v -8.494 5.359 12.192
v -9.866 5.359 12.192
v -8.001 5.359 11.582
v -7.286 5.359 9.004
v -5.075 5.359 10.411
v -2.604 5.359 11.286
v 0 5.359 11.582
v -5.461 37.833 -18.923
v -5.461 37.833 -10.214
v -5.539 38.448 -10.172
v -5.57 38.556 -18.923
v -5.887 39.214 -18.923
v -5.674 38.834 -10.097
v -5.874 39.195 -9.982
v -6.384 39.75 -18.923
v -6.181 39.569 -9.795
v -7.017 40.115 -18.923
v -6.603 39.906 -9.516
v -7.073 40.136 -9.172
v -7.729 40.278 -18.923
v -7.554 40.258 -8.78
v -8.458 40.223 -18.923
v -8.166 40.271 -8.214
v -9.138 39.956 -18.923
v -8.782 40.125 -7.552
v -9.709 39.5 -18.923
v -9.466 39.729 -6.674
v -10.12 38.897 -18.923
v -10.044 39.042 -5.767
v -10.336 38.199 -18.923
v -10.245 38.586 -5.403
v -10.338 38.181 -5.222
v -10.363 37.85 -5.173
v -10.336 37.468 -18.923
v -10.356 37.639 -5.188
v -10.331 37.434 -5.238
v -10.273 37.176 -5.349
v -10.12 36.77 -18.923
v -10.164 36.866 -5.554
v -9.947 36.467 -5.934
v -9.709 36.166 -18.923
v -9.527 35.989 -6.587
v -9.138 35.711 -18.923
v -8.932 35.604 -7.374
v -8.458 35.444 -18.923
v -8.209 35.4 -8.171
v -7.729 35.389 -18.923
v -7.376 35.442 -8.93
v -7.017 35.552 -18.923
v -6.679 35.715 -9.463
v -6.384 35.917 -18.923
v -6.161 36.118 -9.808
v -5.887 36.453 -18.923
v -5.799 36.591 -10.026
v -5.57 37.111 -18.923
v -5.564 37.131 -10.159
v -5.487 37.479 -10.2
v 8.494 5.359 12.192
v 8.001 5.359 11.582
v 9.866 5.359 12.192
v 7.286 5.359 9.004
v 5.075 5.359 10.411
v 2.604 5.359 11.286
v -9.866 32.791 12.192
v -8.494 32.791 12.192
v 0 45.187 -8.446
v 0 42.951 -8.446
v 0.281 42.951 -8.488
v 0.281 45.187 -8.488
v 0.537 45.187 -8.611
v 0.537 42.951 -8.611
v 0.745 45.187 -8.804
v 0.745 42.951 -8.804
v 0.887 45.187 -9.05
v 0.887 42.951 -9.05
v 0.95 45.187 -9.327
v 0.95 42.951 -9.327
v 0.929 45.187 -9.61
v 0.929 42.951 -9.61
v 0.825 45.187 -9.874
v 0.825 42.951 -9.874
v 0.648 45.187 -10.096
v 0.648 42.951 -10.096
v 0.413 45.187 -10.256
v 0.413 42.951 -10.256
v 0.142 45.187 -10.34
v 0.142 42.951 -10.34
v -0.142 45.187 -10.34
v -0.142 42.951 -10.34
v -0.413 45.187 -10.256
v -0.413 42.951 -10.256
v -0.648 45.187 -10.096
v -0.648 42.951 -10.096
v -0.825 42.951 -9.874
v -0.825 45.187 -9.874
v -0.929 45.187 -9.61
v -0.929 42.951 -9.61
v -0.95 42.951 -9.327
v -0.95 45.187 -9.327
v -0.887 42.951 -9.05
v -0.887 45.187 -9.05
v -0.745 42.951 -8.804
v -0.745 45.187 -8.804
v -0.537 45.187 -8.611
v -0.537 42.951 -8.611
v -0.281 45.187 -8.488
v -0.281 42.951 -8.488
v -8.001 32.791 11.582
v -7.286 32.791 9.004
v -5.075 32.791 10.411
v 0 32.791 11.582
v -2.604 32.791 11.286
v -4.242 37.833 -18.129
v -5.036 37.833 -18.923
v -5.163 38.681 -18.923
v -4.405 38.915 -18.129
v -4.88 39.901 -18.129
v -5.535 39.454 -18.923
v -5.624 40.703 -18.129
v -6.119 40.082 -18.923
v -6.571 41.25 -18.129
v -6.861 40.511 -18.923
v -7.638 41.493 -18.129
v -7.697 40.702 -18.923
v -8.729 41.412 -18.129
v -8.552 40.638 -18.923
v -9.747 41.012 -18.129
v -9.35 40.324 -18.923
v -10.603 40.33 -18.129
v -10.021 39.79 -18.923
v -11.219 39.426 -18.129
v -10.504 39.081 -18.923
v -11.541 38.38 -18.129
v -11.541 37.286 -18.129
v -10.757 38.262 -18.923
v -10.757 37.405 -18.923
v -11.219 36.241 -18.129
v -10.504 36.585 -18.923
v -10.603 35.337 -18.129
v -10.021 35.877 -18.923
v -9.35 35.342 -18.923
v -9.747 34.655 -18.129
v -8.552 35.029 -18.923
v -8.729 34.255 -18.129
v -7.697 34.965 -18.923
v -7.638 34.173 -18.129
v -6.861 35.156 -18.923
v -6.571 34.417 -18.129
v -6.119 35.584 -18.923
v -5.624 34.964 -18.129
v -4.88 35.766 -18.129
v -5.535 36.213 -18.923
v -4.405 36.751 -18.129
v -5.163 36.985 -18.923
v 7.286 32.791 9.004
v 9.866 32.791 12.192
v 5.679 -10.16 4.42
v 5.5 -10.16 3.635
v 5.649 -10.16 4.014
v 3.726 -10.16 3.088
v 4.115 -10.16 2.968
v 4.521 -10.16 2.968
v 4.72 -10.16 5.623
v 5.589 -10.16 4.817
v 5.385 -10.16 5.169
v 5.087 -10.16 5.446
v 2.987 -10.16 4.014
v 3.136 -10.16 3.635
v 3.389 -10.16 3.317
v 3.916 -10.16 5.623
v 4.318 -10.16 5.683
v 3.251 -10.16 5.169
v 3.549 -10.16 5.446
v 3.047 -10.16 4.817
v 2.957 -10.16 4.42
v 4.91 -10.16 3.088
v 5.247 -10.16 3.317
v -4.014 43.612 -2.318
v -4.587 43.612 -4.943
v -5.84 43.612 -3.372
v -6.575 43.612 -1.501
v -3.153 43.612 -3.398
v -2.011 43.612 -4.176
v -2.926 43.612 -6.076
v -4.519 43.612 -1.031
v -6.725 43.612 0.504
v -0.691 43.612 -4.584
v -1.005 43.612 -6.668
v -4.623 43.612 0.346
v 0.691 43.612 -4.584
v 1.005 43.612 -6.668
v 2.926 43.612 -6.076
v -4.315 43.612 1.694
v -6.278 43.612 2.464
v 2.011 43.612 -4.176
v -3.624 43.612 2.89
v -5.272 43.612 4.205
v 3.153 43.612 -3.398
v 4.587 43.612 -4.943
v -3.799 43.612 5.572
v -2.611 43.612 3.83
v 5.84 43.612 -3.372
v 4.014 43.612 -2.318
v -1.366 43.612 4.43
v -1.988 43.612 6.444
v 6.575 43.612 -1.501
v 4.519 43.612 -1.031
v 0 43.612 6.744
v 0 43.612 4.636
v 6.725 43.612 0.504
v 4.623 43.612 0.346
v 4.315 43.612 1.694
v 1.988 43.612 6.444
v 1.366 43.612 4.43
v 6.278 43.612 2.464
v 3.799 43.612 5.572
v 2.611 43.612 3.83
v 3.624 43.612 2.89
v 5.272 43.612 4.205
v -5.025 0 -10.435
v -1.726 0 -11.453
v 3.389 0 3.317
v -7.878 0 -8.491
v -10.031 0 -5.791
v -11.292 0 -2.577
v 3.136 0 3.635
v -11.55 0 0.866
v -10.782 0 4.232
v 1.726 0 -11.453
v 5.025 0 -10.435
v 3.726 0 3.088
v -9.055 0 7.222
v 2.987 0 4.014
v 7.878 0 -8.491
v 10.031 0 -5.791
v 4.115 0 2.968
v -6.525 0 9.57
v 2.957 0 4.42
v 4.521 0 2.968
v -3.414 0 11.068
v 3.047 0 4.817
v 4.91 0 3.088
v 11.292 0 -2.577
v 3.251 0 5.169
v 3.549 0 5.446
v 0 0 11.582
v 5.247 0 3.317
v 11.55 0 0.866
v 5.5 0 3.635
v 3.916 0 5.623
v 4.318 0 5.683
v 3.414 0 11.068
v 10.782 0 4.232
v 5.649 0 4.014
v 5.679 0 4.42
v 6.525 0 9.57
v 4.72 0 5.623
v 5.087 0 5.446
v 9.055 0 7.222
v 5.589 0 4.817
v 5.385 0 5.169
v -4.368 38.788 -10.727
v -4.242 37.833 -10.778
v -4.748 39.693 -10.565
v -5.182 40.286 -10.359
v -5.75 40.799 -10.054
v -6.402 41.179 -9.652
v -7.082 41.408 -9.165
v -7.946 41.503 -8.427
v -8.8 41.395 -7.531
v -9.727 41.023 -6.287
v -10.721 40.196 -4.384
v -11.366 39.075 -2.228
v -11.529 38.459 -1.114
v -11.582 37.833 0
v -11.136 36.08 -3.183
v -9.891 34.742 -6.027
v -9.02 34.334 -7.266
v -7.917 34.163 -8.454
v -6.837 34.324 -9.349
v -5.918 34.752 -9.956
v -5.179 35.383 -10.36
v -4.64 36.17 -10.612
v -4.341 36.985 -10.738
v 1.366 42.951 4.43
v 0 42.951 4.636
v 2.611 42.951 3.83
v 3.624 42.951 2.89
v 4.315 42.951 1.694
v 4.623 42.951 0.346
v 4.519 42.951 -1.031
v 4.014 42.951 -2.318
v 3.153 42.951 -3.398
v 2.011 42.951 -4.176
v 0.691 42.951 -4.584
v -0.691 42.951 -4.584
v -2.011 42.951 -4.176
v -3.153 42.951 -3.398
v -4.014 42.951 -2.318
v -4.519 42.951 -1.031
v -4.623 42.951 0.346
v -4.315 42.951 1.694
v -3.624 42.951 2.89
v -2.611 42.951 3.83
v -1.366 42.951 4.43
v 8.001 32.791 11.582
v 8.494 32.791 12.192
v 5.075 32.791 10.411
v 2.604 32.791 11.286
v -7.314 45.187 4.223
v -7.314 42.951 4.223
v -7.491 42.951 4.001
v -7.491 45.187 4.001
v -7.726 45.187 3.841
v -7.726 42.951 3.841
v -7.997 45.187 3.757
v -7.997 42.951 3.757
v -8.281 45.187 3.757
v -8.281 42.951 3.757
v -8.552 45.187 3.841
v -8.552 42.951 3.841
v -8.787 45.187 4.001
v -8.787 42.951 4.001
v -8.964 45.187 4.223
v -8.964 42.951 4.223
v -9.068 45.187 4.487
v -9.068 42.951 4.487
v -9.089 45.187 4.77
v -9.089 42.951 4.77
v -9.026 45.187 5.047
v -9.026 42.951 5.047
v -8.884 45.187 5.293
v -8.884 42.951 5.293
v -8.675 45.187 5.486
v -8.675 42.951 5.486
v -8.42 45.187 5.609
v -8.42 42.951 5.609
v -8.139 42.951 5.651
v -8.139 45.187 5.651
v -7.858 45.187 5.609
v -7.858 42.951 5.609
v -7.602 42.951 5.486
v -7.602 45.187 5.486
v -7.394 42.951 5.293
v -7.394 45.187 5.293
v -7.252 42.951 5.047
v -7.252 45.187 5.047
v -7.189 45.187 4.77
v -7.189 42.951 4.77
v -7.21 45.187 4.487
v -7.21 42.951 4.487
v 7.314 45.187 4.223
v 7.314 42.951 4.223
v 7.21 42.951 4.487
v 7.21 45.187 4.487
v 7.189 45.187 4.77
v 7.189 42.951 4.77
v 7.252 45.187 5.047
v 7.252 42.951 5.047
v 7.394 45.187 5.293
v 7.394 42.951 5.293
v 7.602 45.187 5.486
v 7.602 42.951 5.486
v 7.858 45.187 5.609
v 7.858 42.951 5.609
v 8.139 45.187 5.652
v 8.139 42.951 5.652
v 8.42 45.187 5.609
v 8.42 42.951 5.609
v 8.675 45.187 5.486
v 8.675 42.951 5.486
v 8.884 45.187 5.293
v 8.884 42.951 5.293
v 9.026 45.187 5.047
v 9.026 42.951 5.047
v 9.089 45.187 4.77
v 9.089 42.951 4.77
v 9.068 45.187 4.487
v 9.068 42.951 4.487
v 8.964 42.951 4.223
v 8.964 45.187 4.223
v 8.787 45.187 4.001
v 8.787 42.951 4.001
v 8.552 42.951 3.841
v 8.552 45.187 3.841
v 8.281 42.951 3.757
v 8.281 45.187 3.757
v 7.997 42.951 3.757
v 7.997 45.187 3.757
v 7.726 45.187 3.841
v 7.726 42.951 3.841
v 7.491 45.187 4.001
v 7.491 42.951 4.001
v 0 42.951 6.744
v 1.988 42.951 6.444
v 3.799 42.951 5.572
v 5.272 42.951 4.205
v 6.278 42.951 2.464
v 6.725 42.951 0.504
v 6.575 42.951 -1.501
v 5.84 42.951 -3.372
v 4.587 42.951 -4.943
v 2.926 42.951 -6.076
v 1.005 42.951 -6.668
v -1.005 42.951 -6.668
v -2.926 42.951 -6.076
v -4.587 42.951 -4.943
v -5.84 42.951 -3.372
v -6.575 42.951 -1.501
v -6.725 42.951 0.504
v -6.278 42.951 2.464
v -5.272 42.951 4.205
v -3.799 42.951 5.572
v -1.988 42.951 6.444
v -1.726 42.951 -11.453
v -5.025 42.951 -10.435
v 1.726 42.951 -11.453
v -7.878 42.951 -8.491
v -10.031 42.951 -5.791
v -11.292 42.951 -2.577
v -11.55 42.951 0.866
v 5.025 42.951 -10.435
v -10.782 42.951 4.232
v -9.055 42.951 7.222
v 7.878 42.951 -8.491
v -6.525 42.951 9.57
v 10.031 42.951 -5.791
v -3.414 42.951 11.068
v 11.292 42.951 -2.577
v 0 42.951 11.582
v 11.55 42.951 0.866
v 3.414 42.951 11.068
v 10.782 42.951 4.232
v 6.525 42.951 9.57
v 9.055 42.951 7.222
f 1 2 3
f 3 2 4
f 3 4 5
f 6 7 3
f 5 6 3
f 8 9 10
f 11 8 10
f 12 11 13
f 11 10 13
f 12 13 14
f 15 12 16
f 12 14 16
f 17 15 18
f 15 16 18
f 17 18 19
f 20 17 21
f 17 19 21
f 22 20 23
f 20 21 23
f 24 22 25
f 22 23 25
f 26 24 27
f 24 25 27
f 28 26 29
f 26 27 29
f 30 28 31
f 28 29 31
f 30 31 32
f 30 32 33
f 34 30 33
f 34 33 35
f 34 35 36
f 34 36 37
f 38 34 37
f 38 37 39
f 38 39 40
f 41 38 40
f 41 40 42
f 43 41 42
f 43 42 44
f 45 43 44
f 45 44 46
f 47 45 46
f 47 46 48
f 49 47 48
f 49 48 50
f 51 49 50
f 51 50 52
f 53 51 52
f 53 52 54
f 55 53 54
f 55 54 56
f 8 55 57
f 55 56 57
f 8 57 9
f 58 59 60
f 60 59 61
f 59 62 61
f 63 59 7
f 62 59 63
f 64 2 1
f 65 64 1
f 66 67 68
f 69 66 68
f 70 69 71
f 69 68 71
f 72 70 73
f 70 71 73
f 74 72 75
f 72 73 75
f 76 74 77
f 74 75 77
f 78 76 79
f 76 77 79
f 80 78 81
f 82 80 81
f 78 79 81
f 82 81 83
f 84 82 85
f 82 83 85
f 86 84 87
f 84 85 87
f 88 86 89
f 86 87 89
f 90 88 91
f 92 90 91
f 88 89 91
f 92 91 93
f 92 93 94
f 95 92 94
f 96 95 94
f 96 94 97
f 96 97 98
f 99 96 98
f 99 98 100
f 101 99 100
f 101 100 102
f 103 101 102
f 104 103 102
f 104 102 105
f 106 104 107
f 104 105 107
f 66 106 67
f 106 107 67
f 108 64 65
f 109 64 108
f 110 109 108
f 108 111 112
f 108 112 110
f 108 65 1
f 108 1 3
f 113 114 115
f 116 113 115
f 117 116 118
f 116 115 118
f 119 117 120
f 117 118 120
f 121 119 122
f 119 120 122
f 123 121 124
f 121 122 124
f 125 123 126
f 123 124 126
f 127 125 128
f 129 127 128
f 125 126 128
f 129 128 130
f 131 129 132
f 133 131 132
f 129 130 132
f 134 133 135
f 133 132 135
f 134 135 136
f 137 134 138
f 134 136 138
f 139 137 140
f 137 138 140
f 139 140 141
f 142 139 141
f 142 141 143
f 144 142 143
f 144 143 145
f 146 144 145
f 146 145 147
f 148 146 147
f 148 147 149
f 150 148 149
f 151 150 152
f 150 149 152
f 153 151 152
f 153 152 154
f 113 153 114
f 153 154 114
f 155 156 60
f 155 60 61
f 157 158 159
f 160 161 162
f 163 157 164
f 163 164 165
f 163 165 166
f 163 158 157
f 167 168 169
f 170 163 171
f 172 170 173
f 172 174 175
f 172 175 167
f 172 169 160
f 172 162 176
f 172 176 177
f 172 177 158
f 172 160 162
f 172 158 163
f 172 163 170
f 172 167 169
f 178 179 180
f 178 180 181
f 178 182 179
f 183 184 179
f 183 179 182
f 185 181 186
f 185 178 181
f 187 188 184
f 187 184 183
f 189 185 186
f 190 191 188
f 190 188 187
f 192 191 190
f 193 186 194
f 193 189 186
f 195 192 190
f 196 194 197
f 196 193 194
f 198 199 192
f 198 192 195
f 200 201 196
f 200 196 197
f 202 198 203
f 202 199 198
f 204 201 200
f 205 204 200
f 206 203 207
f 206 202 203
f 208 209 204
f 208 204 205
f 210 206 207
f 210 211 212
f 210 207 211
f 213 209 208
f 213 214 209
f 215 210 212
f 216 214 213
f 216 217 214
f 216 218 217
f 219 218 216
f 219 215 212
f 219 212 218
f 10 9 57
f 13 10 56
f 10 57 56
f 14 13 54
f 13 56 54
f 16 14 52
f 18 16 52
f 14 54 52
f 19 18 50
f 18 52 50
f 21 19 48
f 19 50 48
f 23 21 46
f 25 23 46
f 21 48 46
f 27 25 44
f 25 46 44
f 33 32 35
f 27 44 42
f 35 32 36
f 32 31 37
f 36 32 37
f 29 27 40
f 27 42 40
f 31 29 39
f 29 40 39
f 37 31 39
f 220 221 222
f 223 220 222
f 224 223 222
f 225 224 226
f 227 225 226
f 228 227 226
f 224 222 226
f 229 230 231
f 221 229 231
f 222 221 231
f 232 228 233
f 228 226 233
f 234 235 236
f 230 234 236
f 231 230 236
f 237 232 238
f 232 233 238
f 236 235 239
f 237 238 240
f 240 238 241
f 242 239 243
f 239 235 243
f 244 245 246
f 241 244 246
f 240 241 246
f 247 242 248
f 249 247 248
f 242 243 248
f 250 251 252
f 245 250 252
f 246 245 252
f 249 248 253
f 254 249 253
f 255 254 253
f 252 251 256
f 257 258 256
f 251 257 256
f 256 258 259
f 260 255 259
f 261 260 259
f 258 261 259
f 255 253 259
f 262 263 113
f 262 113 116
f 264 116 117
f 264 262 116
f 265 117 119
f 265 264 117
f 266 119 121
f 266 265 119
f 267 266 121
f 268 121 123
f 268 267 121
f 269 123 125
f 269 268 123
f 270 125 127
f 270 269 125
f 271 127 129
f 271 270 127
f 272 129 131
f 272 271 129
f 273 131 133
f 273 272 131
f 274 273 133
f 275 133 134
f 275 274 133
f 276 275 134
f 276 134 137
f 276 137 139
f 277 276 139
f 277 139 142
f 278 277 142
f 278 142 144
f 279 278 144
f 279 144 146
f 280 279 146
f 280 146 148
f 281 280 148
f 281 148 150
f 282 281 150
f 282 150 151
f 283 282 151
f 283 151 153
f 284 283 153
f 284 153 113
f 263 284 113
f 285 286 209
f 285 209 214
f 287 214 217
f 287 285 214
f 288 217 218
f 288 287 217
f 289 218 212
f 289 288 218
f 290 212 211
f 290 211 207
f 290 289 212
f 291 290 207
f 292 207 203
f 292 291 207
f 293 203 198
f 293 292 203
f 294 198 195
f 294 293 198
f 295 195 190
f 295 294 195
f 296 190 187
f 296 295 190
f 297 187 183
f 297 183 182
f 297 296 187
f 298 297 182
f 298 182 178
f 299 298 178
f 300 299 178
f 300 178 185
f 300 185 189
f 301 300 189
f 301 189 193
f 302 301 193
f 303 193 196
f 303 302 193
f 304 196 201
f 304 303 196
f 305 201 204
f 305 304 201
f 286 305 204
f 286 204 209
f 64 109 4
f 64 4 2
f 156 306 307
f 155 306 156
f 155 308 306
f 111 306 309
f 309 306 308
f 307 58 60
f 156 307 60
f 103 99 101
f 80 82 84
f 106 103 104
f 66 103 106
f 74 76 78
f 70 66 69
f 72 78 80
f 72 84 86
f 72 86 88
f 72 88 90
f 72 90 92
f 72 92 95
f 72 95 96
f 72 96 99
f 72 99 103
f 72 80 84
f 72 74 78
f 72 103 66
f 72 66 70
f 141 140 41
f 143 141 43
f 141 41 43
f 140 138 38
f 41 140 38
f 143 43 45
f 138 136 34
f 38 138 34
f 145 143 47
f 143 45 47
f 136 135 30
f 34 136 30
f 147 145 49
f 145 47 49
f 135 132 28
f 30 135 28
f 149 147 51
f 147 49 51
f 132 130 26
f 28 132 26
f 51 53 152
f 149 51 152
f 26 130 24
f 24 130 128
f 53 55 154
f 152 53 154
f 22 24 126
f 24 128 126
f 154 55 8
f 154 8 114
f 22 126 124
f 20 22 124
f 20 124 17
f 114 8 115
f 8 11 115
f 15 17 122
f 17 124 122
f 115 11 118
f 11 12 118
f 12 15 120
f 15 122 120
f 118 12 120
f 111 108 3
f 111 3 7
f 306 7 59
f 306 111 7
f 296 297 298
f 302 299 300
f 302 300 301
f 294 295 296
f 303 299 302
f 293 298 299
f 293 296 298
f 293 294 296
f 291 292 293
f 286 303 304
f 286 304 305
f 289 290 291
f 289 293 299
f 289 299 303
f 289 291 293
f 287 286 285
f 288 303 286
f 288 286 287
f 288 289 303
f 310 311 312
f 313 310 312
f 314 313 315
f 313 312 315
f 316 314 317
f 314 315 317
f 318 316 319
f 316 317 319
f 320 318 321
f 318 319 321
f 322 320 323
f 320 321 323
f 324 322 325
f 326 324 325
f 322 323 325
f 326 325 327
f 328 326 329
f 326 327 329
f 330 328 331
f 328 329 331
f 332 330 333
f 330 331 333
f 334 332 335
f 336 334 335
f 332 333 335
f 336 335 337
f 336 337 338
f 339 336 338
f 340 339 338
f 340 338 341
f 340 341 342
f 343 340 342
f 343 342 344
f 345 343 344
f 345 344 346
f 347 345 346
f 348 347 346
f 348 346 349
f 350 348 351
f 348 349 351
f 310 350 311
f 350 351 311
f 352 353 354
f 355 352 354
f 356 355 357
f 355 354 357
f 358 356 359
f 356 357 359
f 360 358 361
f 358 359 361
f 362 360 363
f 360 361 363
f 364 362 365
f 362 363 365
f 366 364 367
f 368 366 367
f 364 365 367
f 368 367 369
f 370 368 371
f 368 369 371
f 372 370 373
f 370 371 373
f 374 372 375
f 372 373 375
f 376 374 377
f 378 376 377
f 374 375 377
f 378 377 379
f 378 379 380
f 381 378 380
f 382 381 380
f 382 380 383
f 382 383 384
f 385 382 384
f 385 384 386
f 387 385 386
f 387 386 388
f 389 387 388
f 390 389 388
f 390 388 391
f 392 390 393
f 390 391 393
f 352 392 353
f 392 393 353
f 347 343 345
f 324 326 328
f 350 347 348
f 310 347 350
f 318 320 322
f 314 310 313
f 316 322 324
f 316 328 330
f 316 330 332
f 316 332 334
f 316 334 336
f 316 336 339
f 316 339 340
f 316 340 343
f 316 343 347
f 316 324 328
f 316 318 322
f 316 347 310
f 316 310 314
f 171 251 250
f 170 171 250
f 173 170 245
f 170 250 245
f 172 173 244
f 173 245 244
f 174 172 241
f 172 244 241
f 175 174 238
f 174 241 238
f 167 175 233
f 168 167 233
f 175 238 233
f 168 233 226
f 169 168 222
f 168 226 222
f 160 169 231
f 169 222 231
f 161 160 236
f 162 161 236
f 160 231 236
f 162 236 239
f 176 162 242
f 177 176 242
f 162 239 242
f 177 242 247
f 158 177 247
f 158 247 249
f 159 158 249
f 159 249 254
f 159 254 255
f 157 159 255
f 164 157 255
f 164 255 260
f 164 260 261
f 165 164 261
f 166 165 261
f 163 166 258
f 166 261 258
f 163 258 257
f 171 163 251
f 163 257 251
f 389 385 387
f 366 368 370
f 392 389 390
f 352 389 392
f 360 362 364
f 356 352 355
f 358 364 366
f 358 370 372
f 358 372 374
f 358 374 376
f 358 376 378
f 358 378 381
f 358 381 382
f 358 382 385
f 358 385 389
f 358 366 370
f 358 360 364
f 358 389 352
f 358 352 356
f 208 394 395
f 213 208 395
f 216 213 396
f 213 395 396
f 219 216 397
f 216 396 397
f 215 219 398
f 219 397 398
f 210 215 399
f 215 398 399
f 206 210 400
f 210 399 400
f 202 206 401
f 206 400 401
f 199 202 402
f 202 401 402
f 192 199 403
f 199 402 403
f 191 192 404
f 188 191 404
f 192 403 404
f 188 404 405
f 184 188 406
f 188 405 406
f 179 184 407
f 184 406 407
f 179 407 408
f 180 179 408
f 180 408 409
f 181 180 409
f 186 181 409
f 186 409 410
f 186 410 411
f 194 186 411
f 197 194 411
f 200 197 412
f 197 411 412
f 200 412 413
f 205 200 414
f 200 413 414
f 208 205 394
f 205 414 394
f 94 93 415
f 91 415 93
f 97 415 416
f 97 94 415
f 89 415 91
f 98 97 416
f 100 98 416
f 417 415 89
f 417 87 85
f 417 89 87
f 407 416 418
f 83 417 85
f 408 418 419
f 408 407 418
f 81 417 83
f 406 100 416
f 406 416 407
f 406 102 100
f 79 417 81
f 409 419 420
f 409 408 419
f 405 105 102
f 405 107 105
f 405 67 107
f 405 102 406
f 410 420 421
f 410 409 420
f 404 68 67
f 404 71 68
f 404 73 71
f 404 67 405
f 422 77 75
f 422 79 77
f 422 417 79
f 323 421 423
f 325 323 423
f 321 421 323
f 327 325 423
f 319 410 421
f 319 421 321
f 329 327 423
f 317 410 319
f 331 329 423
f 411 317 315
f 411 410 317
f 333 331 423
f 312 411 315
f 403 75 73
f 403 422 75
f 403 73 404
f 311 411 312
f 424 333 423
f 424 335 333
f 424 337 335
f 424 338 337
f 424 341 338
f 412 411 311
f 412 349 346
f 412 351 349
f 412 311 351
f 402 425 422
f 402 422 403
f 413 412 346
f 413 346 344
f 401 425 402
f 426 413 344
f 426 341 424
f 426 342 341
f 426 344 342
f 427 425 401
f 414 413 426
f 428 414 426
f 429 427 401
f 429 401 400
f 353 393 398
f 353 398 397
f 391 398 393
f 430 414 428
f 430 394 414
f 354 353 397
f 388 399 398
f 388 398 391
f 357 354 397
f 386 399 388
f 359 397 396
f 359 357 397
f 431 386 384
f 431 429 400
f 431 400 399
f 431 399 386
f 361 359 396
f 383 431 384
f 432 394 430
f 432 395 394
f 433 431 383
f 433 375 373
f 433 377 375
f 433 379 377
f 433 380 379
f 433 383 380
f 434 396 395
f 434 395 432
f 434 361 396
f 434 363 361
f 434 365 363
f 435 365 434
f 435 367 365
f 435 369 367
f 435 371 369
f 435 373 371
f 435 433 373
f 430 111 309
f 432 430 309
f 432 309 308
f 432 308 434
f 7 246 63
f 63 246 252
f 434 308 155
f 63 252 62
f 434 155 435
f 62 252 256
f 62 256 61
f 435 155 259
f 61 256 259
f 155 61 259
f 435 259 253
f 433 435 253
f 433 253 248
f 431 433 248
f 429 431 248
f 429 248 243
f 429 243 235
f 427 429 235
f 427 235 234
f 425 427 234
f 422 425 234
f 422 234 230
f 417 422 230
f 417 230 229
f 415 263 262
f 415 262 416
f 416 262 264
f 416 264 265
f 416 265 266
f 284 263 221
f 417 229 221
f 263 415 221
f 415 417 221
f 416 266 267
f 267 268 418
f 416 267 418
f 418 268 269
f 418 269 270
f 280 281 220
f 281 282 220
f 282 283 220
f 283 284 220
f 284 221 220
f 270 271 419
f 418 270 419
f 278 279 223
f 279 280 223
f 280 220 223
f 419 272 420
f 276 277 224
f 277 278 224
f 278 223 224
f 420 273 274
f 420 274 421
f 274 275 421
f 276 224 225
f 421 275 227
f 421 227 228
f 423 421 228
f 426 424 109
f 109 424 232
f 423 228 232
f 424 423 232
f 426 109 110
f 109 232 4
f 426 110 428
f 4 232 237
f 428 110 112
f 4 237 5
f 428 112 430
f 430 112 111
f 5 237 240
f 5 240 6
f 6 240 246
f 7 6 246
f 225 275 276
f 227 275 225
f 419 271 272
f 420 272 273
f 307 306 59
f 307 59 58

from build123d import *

# Parameters (mm, degrees)
SKETCH1_R           = 11.5824
BOSS_EXTRUDE1_DEPTH = 42.9514
SKETCH2_R           = 6.7437
SKETCH2_R_2         = 4.6355
BOSS_EXTRUDE2_DEPTH = 0.6604
SKETCH3_R           = 0.9525
BOSS_EXTRUDE3_DEPTH = 2.2352
CIRPATTERN1_COUNT   = 3
SKETCH4_R           = 3.6703
SKETCH4_R_2         = 2.4511
BOSS_EXTRUDE4_DEPTH = 18.923
CHAMFER1_SIZE       = 0.79375
SKETCH5_R           = 1.36525
BOSS_EXTRUDE5_DEPTH = 10.16
BOSS_EXTRUDE6_DEPTH = 27.432


with BuildPart() as part:
    # Sketch1 → Boss-Extrude1 (new body)
    with BuildSketch(Plane(origin=(0, 0, 0), x_dir=(1, 0, 0), z_dir=(0, 1, 0))):
        with Locations(Location((0, 0, 0), (0, 0, 270))):
            Circle(SKETCH1_R)
    extrude(amount=BOSS_EXTRUDE1_DEPTH)

    # Sketch2 → Boss-Extrude2 (add)
    with BuildSketch(Plane(origin=(0, 42.9514, 0), x_dir=(1, 0, 0), z_dir=(0, 1, 0))):
        with Locations(Location((0, 0, 0), (0, 0, 270))):
            Circle(SKETCH2_R)
        with Locations(Location((0, 0, 0), (0, 0, 270))):
            Circle(SKETCH2_R_2, mode=Mode.SUBTRACT)
    extrude(amount=BOSS_EXTRUDE2_DEPTH)

    # Sketch3 → Boss-Extrude3 (add)
    with BuildSketch(Plane(origin=(0, 42.9514, 0), x_dir=(1, 0, 0), z_dir=(0, 1, 0))):
        with Locations(Location((0, 9.398, 0), (0, 0, 270))):
            Circle(SKETCH3_R)
    boss_extrude3 = extrude(amount=BOSS_EXTRUDE3_DEPTH)

    # CirPattern1: Boss-Extrude3 ×3 about axis
    cirpattern1_axis = Axis((0, 0, 0), (0, 1, 0))
    for i in range(1, CIRPATTERN1_COUNT):
        add(boss_extrude3.rotate(cirpattern1_axis, i * 360 / CIRPATTERN1_COUNT))

    # Sketch4 → Boss-Extrude4 (add)
    with BuildSketch(Plane.XY):
        with Locations((-7.9121, 37.8333)):
            Circle(SKETCH4_R)
        with Locations((-7.9121, 37.8333)):
            Circle(SKETCH4_R_2, mode=Mode.SUBTRACT)
    extrude(amount=-BOSS_EXTRUDE4_DEPTH)

    # Chamfer1
    chamfer1_edges = [part.edges().sort_by_distance(p)[0] for p in [
        (-11.5824, 37.8333, -18.923),
    ]]
    chamfer(chamfer1_edges, length=CHAMFER1_SIZE)

    # Sketch5 → Boss-Extrude5 (add)
    with BuildSketch(Plane.XZ):
        with Locations(Location((4.318, 4.318, 0), (0, 0, 90))):
            Circle(SKETCH5_R)
    extrude(amount=BOSS_EXTRUDE5_DEPTH)

    # Sketch7 → Boss-Extrude6 (add)
    with BuildSketch(Plane(origin=(0, 32.7914, 0), x_dir=(1, 0, 0), z_dir=(0, 1, 0))):
        Polygon((0, 0), (0, -11.5824), (8.001, -11.5824), (8.494294737, -12.192), (9.865894737, -12.192), align=None)
        Polygon((-8.494294737, -12.192), (-8.001, -11.5824), (0, -11.5824), (0, 0), (-9.865894737, -12.192), align=None)
    extrude(amount=-BOSS_EXTRUDE6_DEPTH)


solid = part.part
